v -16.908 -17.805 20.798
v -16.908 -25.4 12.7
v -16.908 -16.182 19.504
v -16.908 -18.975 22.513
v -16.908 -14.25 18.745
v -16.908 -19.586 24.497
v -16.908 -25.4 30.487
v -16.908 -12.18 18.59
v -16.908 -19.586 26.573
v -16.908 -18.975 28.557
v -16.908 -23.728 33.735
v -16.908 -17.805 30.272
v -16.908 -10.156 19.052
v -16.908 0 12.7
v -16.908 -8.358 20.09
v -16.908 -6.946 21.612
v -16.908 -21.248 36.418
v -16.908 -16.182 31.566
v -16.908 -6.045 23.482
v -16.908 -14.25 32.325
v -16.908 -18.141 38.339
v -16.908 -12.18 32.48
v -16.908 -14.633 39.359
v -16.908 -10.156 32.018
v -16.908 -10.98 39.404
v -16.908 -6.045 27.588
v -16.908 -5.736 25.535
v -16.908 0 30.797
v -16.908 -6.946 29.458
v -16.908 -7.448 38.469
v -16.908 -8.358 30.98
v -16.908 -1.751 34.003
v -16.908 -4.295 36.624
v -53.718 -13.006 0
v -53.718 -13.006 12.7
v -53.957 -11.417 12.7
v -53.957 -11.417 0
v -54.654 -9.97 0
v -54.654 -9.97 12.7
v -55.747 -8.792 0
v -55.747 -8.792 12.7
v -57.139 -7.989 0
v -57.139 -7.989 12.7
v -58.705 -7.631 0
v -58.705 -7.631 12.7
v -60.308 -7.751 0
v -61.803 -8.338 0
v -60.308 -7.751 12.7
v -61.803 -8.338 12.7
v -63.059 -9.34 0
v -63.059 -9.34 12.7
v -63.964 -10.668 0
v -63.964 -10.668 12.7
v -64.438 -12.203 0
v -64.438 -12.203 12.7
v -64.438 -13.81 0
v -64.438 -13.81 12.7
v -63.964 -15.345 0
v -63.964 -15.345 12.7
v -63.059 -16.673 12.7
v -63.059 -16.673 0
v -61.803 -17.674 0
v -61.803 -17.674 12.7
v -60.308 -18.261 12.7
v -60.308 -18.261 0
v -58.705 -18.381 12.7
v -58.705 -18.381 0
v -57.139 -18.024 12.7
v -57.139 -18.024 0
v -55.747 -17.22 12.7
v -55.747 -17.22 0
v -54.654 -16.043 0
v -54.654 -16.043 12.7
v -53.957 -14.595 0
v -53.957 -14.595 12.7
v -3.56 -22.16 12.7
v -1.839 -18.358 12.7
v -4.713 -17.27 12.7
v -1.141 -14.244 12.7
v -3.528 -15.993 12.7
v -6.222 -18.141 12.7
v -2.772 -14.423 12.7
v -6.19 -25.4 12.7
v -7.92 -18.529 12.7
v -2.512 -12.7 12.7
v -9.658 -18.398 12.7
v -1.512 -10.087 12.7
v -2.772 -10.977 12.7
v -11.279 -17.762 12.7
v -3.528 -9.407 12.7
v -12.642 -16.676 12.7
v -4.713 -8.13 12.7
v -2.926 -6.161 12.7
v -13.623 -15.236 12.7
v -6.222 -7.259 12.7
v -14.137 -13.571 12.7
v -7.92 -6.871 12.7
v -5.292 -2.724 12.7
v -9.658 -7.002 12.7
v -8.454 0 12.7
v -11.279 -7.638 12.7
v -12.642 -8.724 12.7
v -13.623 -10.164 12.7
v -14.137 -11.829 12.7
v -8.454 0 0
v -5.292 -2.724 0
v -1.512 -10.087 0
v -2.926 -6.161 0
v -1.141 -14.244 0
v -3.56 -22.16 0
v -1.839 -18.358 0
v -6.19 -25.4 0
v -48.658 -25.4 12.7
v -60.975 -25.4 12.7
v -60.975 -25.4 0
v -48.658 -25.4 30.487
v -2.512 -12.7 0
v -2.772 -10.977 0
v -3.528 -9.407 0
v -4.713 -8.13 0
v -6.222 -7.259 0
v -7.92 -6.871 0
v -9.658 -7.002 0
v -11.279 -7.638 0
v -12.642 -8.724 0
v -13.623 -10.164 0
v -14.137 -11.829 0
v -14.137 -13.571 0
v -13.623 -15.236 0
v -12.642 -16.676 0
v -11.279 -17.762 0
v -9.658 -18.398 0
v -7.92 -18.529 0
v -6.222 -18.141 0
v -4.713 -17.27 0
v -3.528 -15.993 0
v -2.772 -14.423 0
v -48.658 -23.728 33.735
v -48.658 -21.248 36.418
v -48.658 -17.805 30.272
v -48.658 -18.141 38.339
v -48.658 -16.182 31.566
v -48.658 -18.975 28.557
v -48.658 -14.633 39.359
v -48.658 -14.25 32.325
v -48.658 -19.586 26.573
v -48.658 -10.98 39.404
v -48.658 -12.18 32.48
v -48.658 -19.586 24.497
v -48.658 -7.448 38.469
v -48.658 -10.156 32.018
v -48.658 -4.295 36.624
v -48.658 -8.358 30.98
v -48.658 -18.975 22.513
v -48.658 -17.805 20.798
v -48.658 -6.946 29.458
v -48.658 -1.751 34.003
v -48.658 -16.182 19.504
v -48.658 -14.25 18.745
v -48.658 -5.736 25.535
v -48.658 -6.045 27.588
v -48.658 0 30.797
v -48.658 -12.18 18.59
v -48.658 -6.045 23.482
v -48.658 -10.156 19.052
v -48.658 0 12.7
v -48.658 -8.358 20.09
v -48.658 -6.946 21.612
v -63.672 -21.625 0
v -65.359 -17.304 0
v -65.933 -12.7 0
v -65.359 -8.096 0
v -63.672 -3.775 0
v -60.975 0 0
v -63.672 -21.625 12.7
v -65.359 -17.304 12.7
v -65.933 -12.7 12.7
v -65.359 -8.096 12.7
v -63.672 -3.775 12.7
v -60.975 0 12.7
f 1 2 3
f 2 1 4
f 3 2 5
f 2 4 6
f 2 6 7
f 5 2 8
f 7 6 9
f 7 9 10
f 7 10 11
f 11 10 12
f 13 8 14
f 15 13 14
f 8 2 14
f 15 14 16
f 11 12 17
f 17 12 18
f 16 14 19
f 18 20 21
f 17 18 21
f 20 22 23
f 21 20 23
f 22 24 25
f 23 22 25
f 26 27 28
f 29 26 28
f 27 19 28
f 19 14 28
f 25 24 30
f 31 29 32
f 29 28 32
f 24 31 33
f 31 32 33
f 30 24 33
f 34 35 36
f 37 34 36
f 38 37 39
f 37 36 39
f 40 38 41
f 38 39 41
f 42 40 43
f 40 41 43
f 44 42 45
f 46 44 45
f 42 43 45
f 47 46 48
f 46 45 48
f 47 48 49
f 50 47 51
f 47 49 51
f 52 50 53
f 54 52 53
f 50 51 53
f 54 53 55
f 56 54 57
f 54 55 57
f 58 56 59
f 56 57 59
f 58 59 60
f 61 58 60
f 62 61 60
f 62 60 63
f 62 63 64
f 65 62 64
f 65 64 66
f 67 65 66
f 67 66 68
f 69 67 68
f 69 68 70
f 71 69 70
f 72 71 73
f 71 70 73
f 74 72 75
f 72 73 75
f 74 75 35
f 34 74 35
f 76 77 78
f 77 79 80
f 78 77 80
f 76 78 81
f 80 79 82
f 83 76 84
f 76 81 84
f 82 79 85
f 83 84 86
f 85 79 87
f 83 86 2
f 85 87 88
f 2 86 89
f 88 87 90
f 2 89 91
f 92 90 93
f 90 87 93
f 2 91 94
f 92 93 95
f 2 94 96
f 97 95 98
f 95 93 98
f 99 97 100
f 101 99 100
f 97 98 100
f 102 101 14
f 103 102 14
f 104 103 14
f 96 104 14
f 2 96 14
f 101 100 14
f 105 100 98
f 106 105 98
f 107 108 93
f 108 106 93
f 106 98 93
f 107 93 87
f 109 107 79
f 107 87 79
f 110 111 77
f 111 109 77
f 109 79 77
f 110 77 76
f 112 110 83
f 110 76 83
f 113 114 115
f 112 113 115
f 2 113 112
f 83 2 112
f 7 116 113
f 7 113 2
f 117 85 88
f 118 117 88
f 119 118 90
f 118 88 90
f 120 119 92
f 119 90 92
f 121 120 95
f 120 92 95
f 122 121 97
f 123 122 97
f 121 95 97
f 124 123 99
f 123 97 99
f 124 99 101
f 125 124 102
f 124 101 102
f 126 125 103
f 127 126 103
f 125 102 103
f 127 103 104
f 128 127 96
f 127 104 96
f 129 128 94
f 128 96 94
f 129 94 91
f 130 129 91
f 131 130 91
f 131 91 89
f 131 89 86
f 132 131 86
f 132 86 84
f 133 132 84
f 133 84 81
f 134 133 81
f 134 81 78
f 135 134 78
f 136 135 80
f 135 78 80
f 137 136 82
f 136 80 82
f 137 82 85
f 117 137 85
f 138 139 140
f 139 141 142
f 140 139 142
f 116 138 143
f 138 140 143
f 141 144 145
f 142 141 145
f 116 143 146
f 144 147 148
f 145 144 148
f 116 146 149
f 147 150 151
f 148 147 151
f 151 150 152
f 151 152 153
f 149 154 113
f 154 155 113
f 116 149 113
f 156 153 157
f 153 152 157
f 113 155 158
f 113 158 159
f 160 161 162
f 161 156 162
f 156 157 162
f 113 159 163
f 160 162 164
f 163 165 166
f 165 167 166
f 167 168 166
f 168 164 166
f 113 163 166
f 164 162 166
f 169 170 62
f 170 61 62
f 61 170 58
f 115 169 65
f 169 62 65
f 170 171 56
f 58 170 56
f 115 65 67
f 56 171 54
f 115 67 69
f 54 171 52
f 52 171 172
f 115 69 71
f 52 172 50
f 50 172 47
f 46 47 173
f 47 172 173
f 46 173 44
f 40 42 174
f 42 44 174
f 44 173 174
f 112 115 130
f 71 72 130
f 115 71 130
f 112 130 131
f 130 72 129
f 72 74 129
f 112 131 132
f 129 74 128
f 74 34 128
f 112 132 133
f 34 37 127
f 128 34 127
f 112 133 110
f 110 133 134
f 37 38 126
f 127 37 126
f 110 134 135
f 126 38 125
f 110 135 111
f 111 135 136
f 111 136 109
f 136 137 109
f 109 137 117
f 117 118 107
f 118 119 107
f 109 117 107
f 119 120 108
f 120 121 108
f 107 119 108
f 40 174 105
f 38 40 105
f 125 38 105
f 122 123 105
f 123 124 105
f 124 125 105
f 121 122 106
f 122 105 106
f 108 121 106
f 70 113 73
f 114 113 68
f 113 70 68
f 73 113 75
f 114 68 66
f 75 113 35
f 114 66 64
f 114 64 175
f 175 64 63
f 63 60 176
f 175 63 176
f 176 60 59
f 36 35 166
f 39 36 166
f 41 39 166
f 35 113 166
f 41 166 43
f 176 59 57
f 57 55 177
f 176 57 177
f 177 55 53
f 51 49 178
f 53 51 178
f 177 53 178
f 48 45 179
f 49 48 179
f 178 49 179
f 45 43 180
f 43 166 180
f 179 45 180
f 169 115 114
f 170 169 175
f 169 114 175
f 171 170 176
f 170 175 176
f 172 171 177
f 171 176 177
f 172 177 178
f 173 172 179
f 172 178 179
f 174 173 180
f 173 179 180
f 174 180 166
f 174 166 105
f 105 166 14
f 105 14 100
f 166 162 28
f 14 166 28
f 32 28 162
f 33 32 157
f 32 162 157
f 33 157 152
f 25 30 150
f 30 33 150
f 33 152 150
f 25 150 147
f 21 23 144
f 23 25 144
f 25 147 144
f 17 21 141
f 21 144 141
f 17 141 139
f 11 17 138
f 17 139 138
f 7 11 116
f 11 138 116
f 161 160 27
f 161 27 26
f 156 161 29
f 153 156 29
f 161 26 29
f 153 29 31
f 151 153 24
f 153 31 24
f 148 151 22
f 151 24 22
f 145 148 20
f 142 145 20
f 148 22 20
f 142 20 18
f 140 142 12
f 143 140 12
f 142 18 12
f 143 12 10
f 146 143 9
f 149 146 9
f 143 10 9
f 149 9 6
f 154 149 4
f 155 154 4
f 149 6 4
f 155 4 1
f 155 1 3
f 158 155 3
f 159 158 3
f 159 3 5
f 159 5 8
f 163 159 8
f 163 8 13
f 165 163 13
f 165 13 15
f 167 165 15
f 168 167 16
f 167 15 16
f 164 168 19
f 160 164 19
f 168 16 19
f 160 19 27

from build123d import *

# Parameters (mm, degrees)
F1_DEPTH  = 25.4
F2_R      = 6.964249989
F3_DEPTH  = 31.75
F4_R      = 5.3902000798
F5_DEPTH  = 12.7
F6_R      = 5.8449861695
F7_DEPTH  = 12.7
F9_DEPTH  = 25.4
F11_DEPTH = 25.4
F13_DEPTH = 38.1


with BuildPart() as f1:
    # F0 (on Front) → F1 (new body)
    with BuildSketch(Plane.XZ):
        Polygon((-67.6313243027, 0), (0, 0), (0, 12.7), (-16.9078324569, 12.7), (-16.9078324569, 40.5481918725), (-48.6578324569, 40.5481918725), (-48.6578324569, 12.7), (-67.6313243027, 12.7), align=None)
    extrude(amount=F1_DEPTH)

    # F2 (on face) → F3 (cut)
    with BuildSketch(Plane.YZ.offset(-16.9078324569)):
        with Locations((-12.7, 25.5351066589)):
            Circle(F2_R)
    extrude(amount=-F3_DEPTH, mode=Mode.SUBTRACT)

    # F4 (on face) → F5 (cut)
    with BuildSketch(Plane.XY.offset(12.7)):
        with Locations((-59.1080682221, -13.0062611195)):
            Circle(F4_R)
    extrude(amount=-F5_DEPTH, mode=Mode.SUBTRACT)

    # F6 (on face) → F7 (cut)
    with BuildSketch(Plane.XY.offset(12.7)):
        with Locations((-8.3569446579, -12.7)):
            Circle(F6_R)
    extrude(amount=-F7_DEPTH, mode=Mode.SUBTRACT)

    # F8 (on face) → F9 (cut)
    with BuildSketch(Plane.XY.offset(12.7)):
        with BuildLine():
            ThreePointArc((-8.4539162285, 0), (-1.19277981, -12.1537675148), (-6.1903283931, -25.4))
            Line((-6.1903283931, -25.4), (0, -25.4))
            Line((0, -25.4), (0, 0))
            Line((0, 0), (-8.4539162285, 0))
        make_face()
    extrude(amount=-F9_DEPTH, mode=Mode.SUBTRACT)

    # F10 (on face) → F11 (cut)
    with BuildSketch(Plane.XY.offset(12.7)):
        with BuildLine():
            ThreePointArc((-60.9747394919, -25.4), (-65.9330031069, -12.7), (-60.9747394919, 0))
            Line((-60.9747394919, 0), (-67.6313243027, 0))
            Line((-67.6313243027, 0), (-67.6313243027, -25.4))
            Line((-67.6313243027, -25.4), (-60.9747394919, -25.4))
        make_face()
    extrude(amount=-F11_DEPTH, mode=Mode.SUBTRACT)

    # F12 (on face) → F13 (cut)
    with BuildSketch(Plane(origin=(-48.6578324569, 0, 0), x_dir=(0, -1, 0), z_dir=(-1, 0, 0))):
        with BuildLine():
            ThreePointArc((0, 30.7968873531), (12.8080026983, 39.50517373), (25.4, 30.487369746))
            Line((25.4, 30.487369746), (25.4, 40.5481918725))
            Line((25.4, 40.5481918725), (0, 40.5481918725))
            Line((0, 40.5481918725), (0, 30.7968873531))
        make_face()
    extrude(amount=-F13_DEPTH, mode=Mode.SUBTRACT)


solid = f1.part
